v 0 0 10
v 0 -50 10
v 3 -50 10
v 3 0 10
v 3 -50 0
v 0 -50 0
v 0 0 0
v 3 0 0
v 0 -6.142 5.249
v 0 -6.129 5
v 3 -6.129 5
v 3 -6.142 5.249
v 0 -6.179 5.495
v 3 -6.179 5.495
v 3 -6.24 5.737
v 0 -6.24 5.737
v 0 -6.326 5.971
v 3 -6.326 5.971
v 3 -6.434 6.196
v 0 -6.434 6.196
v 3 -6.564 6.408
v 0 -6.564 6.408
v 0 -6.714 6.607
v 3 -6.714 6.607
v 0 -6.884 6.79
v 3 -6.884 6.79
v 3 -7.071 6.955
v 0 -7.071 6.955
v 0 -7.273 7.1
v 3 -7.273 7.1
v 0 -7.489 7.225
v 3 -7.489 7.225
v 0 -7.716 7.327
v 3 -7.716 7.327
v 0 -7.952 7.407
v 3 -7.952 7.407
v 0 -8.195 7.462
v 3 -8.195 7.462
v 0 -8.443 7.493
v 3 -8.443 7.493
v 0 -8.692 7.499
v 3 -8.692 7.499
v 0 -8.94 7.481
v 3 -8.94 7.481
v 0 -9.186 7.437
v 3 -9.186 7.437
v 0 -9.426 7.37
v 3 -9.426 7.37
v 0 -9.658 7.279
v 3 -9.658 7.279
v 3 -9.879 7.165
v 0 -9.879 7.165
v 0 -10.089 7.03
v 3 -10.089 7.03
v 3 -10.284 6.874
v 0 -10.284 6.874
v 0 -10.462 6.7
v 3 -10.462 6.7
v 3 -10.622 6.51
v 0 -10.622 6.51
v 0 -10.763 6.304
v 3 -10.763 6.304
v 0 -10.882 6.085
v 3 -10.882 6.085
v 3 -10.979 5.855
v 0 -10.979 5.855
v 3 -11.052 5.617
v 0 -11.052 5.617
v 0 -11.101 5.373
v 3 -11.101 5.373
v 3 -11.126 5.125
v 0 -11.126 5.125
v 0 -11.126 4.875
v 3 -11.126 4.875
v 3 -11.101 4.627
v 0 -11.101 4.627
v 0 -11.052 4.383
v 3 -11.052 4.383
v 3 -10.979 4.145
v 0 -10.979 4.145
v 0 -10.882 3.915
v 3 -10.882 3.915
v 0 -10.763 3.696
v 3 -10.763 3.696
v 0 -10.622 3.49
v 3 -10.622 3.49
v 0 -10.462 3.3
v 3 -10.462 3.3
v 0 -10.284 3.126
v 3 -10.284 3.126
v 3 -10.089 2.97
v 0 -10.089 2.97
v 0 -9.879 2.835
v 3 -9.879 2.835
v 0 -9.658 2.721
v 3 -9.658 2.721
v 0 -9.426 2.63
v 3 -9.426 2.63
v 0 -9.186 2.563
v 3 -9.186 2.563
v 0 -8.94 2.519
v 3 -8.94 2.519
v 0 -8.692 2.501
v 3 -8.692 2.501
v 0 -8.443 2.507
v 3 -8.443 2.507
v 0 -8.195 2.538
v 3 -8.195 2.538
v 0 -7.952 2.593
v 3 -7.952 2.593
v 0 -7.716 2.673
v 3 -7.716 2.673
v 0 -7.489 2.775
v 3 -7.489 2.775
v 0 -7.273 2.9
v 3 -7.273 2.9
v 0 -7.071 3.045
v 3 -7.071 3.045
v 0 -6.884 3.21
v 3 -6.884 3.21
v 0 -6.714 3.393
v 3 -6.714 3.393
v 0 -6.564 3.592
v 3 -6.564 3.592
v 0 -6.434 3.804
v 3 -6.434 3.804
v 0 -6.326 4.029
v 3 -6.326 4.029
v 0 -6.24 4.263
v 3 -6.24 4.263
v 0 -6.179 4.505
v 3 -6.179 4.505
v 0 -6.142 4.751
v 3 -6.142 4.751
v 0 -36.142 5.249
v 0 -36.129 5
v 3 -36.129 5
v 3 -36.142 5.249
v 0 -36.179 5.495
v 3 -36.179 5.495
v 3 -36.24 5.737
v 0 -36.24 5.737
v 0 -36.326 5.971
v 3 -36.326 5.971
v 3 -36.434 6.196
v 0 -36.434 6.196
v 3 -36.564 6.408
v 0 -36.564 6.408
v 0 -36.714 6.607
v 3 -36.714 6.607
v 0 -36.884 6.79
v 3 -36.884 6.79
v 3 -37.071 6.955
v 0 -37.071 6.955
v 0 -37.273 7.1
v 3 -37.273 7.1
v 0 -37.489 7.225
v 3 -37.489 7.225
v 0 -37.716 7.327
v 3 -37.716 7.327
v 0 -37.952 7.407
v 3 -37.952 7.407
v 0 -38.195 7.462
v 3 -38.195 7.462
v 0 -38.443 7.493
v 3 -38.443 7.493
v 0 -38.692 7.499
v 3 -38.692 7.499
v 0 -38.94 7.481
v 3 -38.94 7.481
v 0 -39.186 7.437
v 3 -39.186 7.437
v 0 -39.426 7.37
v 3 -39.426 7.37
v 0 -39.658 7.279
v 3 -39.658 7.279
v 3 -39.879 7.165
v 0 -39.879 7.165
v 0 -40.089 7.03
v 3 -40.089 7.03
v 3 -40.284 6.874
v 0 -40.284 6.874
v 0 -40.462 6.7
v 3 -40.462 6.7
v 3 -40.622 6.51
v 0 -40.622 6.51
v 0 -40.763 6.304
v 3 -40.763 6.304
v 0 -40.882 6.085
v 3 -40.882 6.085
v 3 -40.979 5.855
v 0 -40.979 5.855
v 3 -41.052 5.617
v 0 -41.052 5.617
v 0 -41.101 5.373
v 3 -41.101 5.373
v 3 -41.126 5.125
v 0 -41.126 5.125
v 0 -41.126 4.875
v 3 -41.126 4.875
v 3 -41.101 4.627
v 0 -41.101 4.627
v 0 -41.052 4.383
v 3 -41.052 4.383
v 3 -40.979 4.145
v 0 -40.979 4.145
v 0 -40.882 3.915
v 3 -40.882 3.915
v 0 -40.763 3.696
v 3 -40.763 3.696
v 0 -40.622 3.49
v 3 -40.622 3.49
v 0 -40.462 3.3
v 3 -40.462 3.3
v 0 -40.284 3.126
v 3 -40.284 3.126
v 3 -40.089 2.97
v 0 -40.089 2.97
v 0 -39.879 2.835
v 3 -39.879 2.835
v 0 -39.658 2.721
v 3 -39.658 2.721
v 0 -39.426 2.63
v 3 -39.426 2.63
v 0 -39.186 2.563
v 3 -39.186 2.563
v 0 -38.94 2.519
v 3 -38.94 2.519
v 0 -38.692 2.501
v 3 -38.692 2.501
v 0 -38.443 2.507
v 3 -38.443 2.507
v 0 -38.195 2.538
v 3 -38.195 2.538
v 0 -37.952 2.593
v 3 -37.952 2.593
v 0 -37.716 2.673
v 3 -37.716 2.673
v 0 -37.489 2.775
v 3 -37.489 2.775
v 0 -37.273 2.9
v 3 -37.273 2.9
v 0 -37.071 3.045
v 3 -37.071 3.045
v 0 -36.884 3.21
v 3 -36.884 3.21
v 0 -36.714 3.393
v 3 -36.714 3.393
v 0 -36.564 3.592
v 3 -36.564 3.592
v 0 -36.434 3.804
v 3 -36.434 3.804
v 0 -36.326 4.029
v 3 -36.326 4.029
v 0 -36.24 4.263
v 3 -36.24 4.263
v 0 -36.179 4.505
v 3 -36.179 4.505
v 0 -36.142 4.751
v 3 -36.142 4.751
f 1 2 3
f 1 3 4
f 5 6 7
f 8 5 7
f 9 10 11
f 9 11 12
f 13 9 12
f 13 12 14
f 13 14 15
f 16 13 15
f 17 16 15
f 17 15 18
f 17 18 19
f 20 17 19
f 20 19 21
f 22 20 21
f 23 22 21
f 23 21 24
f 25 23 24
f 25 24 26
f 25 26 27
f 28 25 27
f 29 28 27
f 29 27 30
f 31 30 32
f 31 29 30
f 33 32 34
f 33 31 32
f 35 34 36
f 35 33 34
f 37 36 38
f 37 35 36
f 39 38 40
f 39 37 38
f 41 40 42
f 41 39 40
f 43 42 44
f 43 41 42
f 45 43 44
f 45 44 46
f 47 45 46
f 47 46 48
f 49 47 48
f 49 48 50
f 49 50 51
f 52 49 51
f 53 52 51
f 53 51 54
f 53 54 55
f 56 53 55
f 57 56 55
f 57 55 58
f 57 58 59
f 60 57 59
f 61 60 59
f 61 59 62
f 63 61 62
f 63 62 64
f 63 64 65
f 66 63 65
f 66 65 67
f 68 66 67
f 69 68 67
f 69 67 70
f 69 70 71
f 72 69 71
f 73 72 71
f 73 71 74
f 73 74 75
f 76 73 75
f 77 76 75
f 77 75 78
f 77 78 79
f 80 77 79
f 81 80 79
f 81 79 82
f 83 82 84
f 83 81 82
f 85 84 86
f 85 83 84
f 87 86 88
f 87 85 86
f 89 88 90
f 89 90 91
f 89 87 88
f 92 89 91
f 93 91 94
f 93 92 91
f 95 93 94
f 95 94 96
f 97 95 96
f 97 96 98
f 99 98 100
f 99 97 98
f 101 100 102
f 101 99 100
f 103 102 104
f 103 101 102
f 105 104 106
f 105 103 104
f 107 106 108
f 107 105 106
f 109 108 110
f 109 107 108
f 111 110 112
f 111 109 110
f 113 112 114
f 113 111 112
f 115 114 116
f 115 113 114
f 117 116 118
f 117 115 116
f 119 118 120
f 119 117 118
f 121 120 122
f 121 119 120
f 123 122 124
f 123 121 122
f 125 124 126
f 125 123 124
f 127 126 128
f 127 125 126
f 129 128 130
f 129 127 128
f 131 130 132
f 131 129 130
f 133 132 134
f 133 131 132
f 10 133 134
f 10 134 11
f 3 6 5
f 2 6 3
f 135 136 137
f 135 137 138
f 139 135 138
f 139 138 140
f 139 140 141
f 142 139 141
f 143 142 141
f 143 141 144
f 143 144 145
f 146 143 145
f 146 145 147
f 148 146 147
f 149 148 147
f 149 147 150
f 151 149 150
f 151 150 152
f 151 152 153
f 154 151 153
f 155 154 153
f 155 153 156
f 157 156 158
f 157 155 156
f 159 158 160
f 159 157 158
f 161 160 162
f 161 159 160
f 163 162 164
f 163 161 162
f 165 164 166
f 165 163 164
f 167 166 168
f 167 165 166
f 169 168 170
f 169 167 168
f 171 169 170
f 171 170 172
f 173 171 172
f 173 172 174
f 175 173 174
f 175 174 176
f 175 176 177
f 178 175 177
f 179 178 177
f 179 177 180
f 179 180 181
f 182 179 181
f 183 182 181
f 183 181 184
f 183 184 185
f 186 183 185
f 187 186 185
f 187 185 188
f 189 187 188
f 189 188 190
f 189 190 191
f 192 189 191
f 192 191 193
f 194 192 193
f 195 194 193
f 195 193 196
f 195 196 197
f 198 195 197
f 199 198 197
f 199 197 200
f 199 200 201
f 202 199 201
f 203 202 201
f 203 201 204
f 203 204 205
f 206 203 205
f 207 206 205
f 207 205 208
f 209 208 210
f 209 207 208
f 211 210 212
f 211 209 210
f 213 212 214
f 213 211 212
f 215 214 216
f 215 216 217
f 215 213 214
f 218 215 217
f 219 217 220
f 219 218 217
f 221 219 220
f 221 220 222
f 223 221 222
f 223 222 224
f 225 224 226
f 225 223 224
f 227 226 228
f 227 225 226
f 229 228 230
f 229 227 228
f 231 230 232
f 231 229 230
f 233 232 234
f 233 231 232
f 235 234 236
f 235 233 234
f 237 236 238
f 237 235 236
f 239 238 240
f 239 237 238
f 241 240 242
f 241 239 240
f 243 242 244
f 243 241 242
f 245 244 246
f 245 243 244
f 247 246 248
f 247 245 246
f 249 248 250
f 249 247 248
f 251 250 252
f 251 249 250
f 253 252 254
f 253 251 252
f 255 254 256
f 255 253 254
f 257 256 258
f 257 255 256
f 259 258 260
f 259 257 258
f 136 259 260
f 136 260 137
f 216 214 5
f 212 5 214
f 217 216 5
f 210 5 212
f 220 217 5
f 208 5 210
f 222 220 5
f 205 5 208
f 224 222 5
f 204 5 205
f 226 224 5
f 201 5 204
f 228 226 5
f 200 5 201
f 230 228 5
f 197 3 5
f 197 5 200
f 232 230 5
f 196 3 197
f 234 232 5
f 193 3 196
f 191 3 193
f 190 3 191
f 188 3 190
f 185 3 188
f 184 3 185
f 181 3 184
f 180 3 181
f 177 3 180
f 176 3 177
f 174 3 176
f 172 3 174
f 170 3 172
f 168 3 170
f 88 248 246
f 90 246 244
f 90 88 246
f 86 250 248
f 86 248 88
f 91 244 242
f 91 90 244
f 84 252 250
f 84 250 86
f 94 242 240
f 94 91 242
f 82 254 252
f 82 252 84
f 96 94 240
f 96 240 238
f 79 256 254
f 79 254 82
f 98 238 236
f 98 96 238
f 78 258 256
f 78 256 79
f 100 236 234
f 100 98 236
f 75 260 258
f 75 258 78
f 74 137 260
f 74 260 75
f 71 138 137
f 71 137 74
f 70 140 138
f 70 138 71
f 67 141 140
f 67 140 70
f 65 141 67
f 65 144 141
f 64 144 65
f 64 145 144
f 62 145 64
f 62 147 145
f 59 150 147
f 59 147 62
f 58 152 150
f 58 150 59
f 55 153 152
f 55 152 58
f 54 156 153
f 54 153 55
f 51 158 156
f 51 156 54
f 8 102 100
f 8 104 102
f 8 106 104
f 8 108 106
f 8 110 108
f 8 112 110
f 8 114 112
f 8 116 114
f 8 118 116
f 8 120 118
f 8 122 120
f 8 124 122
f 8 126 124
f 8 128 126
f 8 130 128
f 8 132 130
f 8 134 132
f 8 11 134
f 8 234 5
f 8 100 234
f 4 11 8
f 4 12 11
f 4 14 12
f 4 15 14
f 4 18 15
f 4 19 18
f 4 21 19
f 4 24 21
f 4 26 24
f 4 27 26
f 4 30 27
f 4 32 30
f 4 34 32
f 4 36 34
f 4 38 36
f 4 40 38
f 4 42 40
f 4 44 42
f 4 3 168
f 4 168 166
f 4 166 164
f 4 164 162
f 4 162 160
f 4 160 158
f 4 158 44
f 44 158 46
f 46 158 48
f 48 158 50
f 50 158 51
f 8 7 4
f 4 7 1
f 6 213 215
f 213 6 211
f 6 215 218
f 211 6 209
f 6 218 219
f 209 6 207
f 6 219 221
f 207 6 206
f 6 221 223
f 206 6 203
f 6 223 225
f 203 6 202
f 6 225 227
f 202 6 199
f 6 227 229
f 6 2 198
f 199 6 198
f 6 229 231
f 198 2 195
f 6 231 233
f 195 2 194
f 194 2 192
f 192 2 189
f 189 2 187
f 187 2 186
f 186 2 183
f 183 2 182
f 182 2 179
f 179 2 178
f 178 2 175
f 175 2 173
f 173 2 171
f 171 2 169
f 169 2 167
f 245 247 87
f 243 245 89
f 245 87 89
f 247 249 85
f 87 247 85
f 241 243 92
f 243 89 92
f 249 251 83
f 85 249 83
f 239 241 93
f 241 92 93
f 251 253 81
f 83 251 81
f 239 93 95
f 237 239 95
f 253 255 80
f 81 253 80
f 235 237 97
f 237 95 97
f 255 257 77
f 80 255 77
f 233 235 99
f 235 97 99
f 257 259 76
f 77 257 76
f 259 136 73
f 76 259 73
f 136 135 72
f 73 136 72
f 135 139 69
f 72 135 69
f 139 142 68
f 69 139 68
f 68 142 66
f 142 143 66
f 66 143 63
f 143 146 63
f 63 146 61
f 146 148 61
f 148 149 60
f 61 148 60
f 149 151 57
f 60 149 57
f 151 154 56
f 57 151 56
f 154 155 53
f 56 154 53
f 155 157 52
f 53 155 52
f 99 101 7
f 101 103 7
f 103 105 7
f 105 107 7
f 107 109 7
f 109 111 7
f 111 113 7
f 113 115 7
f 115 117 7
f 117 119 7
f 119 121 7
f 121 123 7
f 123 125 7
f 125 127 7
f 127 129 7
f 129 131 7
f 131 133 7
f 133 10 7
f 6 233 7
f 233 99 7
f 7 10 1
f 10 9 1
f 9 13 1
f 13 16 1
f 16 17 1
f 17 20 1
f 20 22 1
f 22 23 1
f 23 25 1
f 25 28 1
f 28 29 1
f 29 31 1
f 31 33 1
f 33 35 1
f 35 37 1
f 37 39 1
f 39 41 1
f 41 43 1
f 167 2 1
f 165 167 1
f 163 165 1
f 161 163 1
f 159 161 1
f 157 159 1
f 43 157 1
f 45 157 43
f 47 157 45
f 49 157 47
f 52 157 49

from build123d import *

# Parameters (mm, degrees)
F0_W     = 50
F0_H     = 10
F0_R     = 2.5
F1_DEPTH = 5
F2_DEPTH = 2


with BuildPart() as f1:
    # F0 (on Right) → F1 (new body)
    with BuildSketch(Plane.YZ):
        with Locations((-25, 5)):
            Rectangle(F0_W, F0_H)
        with Locations((-38.6293791234, 5)):
            Circle(F0_R, mode=Mode.SUBTRACT)
        with Locations((-8.6293791234, 5)):
            Circle(F0_R, mode=Mode.SUBTRACT)
    extrude(amount=F1_DEPTH)

    # F2 (cut): a face of the model
    f2_faces = [f1.faces().sort_by_distance(p)[0] for p in [
        (5, -25.1168236174, 5),
    ]]
    extrude(f2_faces, amount=-F2_DEPTH, mode=Mode.SUBTRACT)


solid = f1.part
